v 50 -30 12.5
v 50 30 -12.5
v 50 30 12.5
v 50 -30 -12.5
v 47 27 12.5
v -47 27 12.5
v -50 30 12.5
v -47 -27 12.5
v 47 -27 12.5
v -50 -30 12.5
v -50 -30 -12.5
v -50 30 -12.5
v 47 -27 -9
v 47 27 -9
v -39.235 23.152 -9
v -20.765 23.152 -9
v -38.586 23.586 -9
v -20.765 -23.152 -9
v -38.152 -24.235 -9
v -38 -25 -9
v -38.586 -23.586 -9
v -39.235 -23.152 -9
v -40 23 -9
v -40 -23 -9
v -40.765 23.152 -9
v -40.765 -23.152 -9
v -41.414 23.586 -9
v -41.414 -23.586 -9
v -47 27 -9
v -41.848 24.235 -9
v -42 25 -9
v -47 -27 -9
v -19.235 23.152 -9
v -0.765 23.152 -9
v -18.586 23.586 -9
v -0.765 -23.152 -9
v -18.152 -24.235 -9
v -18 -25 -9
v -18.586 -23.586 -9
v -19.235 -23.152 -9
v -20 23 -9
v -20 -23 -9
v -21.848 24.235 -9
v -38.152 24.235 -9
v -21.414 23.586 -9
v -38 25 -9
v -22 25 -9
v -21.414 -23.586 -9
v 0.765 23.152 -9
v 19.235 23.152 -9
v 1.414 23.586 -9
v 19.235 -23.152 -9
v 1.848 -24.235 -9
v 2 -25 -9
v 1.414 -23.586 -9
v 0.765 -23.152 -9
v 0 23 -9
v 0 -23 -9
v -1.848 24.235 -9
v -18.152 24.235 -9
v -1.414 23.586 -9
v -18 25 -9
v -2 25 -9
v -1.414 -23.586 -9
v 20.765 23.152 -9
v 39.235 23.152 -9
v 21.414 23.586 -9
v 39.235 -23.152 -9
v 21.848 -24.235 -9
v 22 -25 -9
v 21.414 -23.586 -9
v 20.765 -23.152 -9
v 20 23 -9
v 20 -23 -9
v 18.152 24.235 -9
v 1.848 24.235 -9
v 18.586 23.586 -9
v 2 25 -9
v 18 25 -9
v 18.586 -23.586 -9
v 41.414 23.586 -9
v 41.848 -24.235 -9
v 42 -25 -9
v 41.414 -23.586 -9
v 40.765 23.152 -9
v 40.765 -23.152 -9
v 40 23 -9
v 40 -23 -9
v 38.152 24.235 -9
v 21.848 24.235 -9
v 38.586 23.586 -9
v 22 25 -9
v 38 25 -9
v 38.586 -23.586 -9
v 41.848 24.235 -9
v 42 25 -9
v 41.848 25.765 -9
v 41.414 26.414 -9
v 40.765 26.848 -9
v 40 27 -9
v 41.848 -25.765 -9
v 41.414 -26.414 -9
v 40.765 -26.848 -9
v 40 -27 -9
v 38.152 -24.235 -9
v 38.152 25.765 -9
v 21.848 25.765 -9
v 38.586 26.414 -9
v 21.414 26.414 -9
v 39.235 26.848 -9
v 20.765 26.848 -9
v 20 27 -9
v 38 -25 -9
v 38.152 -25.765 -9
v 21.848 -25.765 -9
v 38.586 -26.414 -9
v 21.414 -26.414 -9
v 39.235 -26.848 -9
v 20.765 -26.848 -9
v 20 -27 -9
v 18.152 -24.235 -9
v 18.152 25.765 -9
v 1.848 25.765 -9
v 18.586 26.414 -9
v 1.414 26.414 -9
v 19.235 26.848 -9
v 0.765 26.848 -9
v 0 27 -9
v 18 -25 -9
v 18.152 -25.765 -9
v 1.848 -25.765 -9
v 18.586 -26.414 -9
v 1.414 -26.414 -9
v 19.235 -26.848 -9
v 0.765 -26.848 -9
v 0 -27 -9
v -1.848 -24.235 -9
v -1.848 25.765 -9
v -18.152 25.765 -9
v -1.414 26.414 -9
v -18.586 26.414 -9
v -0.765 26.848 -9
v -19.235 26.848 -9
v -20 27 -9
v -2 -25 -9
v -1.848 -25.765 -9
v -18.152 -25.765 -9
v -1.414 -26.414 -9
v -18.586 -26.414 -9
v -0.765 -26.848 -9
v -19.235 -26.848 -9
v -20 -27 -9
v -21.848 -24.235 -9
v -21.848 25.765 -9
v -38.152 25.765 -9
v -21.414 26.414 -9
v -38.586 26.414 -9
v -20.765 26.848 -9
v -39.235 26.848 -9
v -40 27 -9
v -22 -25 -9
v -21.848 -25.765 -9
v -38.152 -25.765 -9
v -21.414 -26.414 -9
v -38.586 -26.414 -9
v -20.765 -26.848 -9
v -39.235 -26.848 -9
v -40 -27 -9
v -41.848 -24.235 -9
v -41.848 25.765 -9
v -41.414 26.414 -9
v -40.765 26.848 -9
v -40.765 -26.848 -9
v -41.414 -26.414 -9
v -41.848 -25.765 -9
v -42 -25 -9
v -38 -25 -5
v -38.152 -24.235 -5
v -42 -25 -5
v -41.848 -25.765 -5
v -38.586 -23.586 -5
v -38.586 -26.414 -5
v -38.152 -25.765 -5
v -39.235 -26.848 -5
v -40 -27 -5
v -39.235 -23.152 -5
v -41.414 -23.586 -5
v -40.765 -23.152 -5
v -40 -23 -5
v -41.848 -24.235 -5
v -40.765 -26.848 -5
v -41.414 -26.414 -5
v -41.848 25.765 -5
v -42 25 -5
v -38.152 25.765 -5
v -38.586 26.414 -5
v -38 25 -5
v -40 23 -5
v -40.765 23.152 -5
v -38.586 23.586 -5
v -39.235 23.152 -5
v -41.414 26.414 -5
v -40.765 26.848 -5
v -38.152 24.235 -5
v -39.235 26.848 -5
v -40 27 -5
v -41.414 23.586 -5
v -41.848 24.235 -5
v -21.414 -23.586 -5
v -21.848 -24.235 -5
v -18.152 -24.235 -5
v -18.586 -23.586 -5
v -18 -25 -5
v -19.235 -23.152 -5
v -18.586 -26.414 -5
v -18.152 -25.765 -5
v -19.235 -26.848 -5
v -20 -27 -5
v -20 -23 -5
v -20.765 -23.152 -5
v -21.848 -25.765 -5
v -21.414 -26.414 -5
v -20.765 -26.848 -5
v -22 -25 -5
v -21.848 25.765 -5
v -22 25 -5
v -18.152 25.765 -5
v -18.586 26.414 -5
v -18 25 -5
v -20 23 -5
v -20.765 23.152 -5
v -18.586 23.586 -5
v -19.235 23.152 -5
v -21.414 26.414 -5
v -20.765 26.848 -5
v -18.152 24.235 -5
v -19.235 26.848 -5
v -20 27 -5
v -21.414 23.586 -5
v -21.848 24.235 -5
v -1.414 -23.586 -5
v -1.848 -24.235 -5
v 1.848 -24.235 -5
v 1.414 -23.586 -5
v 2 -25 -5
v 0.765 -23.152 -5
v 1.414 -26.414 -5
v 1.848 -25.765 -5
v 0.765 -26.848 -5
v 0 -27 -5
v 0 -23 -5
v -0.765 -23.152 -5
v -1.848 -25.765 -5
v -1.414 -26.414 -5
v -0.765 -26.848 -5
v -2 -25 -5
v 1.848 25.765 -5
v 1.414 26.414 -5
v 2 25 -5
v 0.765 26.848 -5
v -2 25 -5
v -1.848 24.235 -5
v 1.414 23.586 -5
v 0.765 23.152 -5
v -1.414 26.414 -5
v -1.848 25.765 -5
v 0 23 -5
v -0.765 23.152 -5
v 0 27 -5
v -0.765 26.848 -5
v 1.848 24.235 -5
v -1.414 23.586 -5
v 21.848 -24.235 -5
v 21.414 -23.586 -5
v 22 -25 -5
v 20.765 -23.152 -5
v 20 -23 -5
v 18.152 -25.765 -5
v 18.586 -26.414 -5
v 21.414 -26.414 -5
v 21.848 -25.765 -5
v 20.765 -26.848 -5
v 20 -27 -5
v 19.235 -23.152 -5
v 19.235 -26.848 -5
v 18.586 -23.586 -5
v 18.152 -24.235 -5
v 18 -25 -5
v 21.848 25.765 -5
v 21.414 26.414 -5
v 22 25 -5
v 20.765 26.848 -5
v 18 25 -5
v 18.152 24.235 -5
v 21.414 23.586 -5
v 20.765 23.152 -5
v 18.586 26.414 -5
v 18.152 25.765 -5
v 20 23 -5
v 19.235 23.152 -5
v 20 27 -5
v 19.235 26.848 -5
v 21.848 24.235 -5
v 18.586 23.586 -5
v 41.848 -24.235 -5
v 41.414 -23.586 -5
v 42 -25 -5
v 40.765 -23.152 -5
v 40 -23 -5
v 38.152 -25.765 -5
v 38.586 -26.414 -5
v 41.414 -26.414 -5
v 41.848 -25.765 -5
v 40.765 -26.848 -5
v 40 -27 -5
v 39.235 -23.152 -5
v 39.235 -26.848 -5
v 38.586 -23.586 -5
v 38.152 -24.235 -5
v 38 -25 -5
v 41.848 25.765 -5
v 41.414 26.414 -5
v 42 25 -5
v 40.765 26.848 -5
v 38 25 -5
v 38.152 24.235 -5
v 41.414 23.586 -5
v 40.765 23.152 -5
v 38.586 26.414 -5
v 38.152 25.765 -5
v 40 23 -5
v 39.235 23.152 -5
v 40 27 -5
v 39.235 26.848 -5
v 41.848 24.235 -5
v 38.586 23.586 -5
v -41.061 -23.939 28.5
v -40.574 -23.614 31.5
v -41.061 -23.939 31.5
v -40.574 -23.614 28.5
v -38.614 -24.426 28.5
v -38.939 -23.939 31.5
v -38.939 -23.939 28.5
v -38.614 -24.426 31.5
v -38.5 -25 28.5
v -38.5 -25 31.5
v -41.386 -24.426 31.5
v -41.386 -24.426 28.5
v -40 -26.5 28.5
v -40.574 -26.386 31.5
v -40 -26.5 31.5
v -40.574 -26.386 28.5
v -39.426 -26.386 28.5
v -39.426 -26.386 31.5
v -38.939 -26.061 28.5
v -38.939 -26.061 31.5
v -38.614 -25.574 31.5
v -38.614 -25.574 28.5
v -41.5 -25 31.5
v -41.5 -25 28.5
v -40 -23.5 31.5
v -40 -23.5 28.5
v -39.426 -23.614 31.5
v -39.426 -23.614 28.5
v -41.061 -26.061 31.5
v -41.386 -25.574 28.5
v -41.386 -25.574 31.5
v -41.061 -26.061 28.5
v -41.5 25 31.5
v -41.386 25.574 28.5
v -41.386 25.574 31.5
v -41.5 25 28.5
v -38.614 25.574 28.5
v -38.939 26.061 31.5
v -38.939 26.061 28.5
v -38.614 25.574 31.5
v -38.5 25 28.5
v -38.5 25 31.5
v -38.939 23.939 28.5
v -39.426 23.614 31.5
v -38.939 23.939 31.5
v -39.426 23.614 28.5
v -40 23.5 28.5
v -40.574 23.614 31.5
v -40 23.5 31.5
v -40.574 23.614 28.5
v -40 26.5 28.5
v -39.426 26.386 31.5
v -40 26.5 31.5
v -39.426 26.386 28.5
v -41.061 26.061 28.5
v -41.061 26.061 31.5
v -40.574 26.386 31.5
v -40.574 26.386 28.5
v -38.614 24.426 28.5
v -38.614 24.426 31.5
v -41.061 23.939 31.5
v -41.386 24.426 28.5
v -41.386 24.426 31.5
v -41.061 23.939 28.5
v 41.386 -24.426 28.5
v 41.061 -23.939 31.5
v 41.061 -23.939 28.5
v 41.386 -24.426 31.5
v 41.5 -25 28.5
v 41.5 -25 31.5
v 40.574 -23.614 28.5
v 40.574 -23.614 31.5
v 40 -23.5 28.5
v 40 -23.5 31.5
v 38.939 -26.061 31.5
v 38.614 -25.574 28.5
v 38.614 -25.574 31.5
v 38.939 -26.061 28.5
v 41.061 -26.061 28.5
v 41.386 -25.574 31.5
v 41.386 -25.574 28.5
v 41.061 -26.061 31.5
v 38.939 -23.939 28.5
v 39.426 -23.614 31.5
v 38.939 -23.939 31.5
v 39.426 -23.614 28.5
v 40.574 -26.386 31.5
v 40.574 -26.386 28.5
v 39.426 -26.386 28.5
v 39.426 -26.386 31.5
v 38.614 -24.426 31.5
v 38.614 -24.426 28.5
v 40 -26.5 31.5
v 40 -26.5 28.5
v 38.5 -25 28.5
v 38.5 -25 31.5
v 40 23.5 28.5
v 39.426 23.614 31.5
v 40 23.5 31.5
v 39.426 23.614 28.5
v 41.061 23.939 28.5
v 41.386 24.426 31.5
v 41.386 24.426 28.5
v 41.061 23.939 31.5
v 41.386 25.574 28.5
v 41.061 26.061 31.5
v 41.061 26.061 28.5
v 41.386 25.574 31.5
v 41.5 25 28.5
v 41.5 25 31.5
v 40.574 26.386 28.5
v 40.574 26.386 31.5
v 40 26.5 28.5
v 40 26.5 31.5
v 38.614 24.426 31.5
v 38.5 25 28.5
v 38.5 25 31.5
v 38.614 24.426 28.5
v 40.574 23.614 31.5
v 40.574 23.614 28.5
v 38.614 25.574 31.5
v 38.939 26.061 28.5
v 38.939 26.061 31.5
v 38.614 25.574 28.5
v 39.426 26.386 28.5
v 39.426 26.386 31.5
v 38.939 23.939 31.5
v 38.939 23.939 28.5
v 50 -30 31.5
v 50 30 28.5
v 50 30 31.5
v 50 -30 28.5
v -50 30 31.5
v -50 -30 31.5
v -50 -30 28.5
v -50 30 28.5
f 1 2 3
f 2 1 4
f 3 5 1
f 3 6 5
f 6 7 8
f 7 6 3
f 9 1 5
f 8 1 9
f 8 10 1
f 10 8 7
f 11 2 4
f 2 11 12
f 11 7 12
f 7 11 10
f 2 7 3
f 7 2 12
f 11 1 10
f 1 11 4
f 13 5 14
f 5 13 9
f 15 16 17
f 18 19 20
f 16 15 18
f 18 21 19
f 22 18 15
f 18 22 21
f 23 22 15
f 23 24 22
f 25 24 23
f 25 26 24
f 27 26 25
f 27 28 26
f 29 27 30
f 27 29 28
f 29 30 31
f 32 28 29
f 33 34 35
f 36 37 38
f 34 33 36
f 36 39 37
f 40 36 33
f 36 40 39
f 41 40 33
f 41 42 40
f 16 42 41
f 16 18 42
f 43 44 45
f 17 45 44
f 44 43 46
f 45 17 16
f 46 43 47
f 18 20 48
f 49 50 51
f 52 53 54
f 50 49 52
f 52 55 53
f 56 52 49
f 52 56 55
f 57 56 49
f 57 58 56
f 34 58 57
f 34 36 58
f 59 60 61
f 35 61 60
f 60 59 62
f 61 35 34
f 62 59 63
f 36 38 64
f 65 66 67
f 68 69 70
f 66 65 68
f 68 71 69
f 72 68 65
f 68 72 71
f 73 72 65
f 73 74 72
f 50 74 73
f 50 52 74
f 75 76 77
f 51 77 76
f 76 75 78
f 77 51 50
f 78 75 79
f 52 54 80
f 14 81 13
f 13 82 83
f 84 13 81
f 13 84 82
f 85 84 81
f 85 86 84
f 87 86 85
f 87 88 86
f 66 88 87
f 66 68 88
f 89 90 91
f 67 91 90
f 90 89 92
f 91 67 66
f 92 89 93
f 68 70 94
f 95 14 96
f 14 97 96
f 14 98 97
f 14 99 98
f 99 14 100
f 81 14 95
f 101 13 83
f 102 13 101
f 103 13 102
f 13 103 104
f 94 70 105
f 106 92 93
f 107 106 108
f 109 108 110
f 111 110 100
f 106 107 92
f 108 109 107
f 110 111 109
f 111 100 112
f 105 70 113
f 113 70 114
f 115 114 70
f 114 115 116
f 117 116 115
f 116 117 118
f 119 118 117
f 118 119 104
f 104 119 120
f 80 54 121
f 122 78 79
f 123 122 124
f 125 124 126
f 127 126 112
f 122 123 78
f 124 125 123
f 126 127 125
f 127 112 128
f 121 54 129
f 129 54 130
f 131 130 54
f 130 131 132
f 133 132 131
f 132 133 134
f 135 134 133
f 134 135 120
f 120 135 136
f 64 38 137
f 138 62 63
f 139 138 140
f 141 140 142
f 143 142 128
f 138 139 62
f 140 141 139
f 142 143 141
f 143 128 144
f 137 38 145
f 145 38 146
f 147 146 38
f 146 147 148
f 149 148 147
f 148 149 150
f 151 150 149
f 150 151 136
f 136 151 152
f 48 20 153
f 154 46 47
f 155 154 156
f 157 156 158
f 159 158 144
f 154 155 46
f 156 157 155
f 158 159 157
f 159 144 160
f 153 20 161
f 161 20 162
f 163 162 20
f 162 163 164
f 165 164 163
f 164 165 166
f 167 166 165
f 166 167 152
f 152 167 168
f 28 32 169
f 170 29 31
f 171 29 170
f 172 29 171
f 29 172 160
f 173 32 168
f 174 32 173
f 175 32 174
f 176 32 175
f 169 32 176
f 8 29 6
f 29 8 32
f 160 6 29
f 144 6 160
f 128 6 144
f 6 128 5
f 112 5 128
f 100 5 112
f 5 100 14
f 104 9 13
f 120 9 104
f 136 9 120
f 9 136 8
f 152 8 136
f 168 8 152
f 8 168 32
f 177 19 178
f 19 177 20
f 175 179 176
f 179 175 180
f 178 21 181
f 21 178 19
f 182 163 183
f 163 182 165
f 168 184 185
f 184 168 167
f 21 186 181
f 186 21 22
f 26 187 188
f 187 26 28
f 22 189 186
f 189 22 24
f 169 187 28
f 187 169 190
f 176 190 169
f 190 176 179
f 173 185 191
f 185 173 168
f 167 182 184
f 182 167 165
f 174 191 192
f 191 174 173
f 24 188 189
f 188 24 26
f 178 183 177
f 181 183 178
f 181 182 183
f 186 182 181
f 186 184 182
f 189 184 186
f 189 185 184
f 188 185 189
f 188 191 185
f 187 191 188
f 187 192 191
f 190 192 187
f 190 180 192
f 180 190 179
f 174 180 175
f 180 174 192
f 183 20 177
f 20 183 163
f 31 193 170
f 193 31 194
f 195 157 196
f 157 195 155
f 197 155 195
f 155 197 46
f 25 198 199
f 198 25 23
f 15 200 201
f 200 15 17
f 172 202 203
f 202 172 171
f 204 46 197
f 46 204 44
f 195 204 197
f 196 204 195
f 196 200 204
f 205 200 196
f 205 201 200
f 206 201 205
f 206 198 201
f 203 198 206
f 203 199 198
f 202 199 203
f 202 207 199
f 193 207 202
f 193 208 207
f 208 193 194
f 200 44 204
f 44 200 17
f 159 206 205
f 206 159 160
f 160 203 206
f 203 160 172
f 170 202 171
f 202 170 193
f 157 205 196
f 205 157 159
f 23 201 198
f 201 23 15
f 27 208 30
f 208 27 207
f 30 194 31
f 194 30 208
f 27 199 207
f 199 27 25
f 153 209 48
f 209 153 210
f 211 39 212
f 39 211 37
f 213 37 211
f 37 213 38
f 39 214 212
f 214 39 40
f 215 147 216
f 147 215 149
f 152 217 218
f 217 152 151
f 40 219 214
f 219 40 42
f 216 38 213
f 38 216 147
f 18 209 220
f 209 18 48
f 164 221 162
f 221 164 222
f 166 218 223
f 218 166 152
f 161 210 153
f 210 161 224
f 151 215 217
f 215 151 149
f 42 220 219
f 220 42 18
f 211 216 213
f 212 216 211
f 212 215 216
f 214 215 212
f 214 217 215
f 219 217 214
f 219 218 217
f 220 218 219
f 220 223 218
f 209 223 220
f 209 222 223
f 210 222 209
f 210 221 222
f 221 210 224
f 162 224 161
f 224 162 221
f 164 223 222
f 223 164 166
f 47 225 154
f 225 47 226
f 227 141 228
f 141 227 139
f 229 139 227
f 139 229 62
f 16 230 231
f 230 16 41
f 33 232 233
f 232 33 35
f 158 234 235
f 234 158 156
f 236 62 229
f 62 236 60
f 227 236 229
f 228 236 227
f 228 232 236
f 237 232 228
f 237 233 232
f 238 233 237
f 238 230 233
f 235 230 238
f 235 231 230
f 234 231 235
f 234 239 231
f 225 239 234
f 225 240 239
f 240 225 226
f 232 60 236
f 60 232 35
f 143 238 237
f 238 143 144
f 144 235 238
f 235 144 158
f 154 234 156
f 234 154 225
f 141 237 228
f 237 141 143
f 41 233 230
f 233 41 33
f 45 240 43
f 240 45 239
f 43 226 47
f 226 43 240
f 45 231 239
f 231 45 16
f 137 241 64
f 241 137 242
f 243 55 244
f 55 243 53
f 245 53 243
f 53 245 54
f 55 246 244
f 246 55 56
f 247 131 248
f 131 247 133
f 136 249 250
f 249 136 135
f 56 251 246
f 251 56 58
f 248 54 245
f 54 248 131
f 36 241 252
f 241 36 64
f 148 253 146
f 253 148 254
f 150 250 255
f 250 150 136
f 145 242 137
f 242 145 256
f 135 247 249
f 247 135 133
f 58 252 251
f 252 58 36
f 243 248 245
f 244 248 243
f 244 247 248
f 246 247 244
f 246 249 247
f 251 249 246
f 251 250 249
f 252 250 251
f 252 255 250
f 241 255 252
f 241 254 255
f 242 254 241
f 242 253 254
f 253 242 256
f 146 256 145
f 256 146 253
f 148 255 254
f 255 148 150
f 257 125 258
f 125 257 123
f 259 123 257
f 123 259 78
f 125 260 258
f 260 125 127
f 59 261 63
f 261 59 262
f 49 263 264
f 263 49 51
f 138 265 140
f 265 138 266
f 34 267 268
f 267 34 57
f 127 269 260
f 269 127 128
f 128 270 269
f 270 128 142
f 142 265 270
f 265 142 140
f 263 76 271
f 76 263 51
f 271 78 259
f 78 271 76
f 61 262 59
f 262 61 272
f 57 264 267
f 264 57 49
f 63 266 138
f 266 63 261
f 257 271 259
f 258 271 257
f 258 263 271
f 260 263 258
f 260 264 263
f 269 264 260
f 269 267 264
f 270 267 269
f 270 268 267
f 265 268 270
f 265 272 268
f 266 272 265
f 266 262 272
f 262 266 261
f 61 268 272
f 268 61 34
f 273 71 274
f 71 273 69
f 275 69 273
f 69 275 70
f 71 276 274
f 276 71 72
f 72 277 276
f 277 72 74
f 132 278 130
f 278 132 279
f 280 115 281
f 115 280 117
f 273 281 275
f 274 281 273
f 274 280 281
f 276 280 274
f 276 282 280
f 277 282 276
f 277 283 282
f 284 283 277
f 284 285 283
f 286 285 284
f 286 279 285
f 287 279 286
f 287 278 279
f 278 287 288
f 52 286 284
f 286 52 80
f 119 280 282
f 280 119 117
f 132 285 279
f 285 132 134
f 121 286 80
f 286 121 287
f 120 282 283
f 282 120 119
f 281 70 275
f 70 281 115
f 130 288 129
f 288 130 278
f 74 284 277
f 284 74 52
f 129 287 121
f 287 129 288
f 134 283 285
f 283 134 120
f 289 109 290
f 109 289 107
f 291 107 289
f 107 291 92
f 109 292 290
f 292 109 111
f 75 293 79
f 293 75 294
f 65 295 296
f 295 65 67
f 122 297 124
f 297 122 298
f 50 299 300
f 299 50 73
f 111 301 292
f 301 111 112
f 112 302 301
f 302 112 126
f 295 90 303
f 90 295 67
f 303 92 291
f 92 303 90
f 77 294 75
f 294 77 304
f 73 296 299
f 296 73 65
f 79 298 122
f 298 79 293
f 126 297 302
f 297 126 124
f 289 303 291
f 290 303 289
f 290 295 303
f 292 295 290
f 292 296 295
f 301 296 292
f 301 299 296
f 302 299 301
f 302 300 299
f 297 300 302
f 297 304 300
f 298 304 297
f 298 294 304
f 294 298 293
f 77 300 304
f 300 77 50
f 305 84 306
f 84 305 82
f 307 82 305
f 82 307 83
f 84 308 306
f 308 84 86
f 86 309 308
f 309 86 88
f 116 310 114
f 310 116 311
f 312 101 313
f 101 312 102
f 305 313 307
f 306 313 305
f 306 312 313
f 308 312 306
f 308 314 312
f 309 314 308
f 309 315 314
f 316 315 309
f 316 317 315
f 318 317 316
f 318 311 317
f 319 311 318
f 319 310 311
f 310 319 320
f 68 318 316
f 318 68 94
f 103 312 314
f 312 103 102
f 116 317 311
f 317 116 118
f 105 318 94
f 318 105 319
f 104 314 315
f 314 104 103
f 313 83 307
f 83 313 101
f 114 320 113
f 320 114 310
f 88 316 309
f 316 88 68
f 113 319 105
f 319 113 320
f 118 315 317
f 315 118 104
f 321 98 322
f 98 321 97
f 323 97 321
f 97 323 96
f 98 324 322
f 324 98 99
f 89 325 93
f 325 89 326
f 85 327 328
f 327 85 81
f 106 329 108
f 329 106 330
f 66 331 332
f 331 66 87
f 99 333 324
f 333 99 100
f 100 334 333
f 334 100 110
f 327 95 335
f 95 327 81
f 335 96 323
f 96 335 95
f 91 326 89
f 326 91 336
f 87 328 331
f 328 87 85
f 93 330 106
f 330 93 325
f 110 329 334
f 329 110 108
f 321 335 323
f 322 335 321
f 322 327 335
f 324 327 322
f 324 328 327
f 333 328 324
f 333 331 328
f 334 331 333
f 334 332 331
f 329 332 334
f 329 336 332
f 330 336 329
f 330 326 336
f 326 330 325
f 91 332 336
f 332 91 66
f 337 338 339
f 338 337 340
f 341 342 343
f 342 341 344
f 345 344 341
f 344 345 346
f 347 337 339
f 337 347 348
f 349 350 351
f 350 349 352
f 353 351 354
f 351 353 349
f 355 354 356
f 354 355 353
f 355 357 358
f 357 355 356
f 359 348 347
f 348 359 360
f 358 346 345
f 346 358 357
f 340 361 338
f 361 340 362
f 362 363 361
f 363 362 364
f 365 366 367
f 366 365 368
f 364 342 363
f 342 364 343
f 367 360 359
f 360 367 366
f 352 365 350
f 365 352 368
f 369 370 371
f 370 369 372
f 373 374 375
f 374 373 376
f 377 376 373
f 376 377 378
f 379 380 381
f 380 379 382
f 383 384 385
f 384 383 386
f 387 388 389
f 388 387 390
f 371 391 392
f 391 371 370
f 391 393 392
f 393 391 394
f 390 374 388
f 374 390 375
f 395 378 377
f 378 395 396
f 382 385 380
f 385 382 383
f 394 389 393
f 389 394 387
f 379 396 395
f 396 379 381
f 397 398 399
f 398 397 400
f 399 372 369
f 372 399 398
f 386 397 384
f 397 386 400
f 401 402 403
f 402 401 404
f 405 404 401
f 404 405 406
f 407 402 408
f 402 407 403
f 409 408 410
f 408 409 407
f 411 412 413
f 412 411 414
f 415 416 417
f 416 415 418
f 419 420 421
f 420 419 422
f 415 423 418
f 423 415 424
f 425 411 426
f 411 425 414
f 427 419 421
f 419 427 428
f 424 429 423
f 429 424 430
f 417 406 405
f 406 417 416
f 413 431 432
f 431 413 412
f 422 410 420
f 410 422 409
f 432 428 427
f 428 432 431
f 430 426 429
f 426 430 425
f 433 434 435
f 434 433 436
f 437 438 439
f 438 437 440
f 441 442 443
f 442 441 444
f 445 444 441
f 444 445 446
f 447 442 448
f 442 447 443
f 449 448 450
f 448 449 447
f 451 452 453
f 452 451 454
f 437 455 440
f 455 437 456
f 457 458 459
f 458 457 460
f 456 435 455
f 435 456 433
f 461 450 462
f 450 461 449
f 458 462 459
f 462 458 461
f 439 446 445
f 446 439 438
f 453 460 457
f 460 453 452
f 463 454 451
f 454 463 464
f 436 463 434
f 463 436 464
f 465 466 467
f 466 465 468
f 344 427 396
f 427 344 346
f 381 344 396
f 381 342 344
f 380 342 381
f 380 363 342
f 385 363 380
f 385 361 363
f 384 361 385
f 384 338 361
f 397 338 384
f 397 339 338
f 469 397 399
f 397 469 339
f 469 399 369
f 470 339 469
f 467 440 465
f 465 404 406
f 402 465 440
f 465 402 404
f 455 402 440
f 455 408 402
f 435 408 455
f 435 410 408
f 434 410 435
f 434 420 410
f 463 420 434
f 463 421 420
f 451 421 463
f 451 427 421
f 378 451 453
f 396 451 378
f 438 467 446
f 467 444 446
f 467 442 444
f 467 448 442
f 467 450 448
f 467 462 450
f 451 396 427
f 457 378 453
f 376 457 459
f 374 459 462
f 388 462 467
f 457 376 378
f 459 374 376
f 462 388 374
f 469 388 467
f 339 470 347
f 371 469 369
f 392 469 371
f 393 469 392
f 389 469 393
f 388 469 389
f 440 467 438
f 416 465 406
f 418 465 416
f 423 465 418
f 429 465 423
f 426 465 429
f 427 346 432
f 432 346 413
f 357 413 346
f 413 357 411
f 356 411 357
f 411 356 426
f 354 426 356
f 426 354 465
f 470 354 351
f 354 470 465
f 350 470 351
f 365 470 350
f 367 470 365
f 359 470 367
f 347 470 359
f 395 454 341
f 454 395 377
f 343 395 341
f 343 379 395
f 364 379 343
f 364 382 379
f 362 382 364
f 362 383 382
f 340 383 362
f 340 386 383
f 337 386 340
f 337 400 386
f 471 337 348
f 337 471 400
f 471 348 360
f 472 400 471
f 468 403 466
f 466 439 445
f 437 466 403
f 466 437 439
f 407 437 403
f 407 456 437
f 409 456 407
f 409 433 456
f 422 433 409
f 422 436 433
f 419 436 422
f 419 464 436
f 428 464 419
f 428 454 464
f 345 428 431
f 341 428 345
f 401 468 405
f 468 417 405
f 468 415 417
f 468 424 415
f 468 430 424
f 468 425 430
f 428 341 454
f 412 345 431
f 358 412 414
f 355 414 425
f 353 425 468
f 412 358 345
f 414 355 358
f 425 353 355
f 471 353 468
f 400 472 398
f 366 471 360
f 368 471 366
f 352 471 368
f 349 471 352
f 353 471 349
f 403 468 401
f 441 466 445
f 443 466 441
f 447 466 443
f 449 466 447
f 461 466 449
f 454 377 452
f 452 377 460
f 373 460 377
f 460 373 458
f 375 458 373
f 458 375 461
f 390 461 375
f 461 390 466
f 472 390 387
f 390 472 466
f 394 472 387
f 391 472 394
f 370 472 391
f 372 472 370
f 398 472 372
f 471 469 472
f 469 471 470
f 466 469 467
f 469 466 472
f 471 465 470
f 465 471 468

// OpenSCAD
// SpektrBio-2 Lot 2.8
module body() { difference() { cube([100,60,25],center=true); translate([0,0,2]) cube([94,54,22],center=true); } }
module mounts() { for(x=[-40,-20,0,20,40]) { translate([x,-25,-10]) cylinder(h=5,r=2,$fn=16); translate([x,25,-10]) cylinder(h=5,r=2,$fn=16); } }
module lid() { translate([0,0,30]) difference() { cube([100,60,3],center=true); for(x=[-40,40]) for(y=[-25,25]) translate([x,y,0]) cylinder(h=5,r=1.5,center=true,$fn=16); } }
color("SteelBlue") body(); color("Gold") mounts(); color("LightBlue",0.7) lid();
